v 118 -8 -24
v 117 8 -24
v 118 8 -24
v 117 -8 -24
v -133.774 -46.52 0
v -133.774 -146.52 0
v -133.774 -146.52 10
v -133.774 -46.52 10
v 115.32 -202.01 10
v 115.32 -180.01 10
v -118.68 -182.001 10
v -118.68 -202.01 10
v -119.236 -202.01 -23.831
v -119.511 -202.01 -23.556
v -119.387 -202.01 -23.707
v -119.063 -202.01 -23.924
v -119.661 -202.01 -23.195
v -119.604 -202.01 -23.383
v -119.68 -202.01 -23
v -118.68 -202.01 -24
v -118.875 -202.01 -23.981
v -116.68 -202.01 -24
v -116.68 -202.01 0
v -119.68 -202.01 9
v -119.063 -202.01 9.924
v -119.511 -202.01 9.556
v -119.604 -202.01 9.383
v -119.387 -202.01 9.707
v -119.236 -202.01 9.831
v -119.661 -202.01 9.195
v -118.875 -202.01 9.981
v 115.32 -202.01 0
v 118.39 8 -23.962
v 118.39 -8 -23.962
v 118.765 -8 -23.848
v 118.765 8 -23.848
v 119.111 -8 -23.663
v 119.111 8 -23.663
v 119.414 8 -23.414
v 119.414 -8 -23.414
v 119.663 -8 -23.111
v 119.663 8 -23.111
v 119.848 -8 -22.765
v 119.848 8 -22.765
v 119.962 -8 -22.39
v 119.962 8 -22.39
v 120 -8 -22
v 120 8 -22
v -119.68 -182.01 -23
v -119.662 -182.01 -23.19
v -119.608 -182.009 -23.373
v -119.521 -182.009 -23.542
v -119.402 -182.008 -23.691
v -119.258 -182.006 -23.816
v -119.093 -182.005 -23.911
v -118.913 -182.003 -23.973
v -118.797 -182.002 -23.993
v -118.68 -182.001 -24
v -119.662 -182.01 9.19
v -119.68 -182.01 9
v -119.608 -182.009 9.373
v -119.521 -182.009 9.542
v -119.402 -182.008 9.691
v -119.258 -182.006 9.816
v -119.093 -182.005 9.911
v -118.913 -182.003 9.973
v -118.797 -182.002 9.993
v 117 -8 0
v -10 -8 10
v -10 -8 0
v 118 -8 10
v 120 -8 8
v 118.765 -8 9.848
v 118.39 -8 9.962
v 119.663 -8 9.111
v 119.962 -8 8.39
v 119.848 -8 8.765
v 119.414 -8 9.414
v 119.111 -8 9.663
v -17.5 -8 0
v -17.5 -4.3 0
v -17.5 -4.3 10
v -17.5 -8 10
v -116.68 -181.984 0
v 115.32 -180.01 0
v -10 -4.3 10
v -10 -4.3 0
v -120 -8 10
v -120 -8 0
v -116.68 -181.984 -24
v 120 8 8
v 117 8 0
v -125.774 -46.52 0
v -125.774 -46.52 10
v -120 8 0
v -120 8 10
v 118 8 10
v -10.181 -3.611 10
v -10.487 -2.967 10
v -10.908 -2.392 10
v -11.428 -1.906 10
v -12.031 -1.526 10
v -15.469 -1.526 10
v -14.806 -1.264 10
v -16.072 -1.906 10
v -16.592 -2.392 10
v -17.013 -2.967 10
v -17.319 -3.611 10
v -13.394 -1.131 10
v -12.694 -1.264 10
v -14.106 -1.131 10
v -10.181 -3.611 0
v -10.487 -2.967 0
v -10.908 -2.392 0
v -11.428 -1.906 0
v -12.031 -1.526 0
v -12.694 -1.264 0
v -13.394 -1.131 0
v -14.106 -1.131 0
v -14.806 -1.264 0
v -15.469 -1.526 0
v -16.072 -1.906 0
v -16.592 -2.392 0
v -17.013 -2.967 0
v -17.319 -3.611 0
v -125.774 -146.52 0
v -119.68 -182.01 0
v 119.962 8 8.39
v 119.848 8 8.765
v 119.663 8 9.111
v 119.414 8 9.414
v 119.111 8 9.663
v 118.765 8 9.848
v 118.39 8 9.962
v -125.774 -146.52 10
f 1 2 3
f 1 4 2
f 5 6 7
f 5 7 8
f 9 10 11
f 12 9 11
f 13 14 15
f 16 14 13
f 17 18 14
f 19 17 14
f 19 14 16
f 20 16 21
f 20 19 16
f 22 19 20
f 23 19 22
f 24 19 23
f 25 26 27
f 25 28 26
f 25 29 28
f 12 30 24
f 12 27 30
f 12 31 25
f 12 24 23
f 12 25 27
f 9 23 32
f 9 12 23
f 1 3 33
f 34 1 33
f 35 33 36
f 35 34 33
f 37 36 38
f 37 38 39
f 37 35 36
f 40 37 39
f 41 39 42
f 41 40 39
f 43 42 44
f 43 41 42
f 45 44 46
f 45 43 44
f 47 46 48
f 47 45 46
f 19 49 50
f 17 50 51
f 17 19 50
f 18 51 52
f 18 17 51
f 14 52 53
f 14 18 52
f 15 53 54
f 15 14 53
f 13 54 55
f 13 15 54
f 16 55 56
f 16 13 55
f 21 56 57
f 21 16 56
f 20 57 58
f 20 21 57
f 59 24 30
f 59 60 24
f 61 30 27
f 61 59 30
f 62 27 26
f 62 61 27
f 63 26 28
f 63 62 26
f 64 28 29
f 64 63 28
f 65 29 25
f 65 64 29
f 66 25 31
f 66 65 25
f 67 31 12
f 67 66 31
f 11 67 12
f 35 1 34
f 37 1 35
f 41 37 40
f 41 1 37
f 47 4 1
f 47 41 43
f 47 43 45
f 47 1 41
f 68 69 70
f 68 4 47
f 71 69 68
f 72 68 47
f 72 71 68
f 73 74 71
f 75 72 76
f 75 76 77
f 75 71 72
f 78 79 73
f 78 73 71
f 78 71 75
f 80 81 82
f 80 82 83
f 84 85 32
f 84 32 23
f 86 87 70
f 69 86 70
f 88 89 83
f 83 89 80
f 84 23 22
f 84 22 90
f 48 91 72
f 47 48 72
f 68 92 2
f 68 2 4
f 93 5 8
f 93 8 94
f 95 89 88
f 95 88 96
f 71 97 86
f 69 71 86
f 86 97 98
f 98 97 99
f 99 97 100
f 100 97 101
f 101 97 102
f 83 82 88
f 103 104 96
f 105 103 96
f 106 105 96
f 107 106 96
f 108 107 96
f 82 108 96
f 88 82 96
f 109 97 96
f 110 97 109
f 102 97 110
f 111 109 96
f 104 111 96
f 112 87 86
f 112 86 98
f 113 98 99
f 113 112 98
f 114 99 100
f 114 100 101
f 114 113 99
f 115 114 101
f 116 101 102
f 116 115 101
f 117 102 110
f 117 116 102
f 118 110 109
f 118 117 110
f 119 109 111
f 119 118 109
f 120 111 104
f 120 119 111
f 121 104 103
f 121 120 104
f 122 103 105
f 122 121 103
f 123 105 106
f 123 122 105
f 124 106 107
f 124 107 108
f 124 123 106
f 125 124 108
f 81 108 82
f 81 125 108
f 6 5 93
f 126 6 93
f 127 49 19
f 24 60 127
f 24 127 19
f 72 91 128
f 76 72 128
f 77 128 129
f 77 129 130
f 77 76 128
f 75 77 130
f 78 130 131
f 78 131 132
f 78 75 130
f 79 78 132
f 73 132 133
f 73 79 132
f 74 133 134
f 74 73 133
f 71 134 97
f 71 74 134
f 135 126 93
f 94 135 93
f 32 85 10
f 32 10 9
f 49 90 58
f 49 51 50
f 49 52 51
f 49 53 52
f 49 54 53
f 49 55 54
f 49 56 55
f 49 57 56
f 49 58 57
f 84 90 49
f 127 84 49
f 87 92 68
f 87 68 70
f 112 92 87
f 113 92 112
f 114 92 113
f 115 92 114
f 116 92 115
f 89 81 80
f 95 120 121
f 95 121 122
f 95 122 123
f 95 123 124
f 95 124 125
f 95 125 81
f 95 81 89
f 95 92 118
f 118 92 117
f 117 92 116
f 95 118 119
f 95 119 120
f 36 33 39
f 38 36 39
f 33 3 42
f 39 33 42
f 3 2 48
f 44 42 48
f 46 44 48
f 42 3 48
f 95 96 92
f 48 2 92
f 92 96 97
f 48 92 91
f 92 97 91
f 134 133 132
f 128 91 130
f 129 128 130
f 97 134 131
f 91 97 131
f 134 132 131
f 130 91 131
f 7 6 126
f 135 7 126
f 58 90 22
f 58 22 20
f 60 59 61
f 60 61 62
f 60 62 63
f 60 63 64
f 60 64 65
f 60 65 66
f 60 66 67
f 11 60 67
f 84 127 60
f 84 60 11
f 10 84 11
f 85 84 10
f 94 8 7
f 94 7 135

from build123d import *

# Parameters (mm, degrees)
PAD_DEPTH    = 10
SKETCH001_W  = 3
SKETCH001_H  = 16
PAD001_DEPTH = 24
FILLET_R     = 2
SKETCH002_W  = 8
SKETCH002_H  = 100
PAD002_DEPTH = 10
PAD003_DEPTH = 10
PAD004_DEPTH = 24
FILLET001_R  = 1


with BuildPart() as body:
    # Sketch → Pad (new body)
    with BuildSketch(Plane.XY):
        with BuildLine():
            Line((-120, 8), (120, 8))
            Line((120, 8), (120, -8))
            Line((120, -8), (-10, -8))
            Line((-10, -4.3), (-10, -8))
            ThreePointArc((-10, -4.3), (-13.75, -1.11441), (-17.5, -4.3))
            Line((-17.5, -4.3), (-17.5, -8))
            Line((-120, -8), (-17.5, -8))
            Line((-120, -8), (-120, 8))
        make_face()
    extrude(amount=PAD_DEPTH)

    # Sketch001 (on Face9 of Pad) → Pad001 (join)
    with BuildSketch(Plane(origin=(0, 0, 0), x_dir=(1, 0, 0), z_dir=(0, 0, -1))):
        with Locations((118.5, 0)):
            Rectangle(SKETCH001_W, SKETCH001_H)
    extrude(amount=PAD001_DEPTH)

    # Fillet
    fillet_edges = [body.edges().sort_by_distance(p)[0] for p in [
        (120, 0, 10),
        (120, 0, -24),
    ]]
    fillet(fillet_edges, radius=FILLET_R)


with BuildPart() as body001:
    # Sketch002 → Pad002 (new body)
    with BuildSketch(Plane.XY):
        with Locations((-129.773869, -96.520366)):
            Rectangle(SKETCH002_W, SKETCH002_H)
    extrude(amount=PAD002_DEPTH)


with BuildPart() as body002:
    # Sketch003 → Pad003 (new body)
    with BuildSketch(Plane.XY):
        Polygon((-119.68, -182.01), (115.32, -180.01), (115.32, -202.01), (-119.68, -202.01), align=None)
    extrude(amount=PAD003_DEPTH)

    # Sketch004 (on Face5 of Pad003) → Pad004 (join)
    with BuildSketch(Plane(origin=(0, 0, 0), x_dir=(1, 0, 0), z_dir=(0, 0, -1))):
        Polygon((-119.68, 202.01), (-116.68, 202.01), (-116.68, 181.984468), (-119.68, 182.01), align=None)
    extrude(amount=PAD004_DEPTH)

    # Fillet001
    fillet001_edges = [body002.edges().sort_by_distance(p)[0] for p in [
        (-119.68, -192.01, 10),
        (-119.68, -192.01, -24),
    ]]
    fillet(fillet001_edges, radius=FILLET001_R)


solid = Compound([body.part, body001.part, body002.part])
